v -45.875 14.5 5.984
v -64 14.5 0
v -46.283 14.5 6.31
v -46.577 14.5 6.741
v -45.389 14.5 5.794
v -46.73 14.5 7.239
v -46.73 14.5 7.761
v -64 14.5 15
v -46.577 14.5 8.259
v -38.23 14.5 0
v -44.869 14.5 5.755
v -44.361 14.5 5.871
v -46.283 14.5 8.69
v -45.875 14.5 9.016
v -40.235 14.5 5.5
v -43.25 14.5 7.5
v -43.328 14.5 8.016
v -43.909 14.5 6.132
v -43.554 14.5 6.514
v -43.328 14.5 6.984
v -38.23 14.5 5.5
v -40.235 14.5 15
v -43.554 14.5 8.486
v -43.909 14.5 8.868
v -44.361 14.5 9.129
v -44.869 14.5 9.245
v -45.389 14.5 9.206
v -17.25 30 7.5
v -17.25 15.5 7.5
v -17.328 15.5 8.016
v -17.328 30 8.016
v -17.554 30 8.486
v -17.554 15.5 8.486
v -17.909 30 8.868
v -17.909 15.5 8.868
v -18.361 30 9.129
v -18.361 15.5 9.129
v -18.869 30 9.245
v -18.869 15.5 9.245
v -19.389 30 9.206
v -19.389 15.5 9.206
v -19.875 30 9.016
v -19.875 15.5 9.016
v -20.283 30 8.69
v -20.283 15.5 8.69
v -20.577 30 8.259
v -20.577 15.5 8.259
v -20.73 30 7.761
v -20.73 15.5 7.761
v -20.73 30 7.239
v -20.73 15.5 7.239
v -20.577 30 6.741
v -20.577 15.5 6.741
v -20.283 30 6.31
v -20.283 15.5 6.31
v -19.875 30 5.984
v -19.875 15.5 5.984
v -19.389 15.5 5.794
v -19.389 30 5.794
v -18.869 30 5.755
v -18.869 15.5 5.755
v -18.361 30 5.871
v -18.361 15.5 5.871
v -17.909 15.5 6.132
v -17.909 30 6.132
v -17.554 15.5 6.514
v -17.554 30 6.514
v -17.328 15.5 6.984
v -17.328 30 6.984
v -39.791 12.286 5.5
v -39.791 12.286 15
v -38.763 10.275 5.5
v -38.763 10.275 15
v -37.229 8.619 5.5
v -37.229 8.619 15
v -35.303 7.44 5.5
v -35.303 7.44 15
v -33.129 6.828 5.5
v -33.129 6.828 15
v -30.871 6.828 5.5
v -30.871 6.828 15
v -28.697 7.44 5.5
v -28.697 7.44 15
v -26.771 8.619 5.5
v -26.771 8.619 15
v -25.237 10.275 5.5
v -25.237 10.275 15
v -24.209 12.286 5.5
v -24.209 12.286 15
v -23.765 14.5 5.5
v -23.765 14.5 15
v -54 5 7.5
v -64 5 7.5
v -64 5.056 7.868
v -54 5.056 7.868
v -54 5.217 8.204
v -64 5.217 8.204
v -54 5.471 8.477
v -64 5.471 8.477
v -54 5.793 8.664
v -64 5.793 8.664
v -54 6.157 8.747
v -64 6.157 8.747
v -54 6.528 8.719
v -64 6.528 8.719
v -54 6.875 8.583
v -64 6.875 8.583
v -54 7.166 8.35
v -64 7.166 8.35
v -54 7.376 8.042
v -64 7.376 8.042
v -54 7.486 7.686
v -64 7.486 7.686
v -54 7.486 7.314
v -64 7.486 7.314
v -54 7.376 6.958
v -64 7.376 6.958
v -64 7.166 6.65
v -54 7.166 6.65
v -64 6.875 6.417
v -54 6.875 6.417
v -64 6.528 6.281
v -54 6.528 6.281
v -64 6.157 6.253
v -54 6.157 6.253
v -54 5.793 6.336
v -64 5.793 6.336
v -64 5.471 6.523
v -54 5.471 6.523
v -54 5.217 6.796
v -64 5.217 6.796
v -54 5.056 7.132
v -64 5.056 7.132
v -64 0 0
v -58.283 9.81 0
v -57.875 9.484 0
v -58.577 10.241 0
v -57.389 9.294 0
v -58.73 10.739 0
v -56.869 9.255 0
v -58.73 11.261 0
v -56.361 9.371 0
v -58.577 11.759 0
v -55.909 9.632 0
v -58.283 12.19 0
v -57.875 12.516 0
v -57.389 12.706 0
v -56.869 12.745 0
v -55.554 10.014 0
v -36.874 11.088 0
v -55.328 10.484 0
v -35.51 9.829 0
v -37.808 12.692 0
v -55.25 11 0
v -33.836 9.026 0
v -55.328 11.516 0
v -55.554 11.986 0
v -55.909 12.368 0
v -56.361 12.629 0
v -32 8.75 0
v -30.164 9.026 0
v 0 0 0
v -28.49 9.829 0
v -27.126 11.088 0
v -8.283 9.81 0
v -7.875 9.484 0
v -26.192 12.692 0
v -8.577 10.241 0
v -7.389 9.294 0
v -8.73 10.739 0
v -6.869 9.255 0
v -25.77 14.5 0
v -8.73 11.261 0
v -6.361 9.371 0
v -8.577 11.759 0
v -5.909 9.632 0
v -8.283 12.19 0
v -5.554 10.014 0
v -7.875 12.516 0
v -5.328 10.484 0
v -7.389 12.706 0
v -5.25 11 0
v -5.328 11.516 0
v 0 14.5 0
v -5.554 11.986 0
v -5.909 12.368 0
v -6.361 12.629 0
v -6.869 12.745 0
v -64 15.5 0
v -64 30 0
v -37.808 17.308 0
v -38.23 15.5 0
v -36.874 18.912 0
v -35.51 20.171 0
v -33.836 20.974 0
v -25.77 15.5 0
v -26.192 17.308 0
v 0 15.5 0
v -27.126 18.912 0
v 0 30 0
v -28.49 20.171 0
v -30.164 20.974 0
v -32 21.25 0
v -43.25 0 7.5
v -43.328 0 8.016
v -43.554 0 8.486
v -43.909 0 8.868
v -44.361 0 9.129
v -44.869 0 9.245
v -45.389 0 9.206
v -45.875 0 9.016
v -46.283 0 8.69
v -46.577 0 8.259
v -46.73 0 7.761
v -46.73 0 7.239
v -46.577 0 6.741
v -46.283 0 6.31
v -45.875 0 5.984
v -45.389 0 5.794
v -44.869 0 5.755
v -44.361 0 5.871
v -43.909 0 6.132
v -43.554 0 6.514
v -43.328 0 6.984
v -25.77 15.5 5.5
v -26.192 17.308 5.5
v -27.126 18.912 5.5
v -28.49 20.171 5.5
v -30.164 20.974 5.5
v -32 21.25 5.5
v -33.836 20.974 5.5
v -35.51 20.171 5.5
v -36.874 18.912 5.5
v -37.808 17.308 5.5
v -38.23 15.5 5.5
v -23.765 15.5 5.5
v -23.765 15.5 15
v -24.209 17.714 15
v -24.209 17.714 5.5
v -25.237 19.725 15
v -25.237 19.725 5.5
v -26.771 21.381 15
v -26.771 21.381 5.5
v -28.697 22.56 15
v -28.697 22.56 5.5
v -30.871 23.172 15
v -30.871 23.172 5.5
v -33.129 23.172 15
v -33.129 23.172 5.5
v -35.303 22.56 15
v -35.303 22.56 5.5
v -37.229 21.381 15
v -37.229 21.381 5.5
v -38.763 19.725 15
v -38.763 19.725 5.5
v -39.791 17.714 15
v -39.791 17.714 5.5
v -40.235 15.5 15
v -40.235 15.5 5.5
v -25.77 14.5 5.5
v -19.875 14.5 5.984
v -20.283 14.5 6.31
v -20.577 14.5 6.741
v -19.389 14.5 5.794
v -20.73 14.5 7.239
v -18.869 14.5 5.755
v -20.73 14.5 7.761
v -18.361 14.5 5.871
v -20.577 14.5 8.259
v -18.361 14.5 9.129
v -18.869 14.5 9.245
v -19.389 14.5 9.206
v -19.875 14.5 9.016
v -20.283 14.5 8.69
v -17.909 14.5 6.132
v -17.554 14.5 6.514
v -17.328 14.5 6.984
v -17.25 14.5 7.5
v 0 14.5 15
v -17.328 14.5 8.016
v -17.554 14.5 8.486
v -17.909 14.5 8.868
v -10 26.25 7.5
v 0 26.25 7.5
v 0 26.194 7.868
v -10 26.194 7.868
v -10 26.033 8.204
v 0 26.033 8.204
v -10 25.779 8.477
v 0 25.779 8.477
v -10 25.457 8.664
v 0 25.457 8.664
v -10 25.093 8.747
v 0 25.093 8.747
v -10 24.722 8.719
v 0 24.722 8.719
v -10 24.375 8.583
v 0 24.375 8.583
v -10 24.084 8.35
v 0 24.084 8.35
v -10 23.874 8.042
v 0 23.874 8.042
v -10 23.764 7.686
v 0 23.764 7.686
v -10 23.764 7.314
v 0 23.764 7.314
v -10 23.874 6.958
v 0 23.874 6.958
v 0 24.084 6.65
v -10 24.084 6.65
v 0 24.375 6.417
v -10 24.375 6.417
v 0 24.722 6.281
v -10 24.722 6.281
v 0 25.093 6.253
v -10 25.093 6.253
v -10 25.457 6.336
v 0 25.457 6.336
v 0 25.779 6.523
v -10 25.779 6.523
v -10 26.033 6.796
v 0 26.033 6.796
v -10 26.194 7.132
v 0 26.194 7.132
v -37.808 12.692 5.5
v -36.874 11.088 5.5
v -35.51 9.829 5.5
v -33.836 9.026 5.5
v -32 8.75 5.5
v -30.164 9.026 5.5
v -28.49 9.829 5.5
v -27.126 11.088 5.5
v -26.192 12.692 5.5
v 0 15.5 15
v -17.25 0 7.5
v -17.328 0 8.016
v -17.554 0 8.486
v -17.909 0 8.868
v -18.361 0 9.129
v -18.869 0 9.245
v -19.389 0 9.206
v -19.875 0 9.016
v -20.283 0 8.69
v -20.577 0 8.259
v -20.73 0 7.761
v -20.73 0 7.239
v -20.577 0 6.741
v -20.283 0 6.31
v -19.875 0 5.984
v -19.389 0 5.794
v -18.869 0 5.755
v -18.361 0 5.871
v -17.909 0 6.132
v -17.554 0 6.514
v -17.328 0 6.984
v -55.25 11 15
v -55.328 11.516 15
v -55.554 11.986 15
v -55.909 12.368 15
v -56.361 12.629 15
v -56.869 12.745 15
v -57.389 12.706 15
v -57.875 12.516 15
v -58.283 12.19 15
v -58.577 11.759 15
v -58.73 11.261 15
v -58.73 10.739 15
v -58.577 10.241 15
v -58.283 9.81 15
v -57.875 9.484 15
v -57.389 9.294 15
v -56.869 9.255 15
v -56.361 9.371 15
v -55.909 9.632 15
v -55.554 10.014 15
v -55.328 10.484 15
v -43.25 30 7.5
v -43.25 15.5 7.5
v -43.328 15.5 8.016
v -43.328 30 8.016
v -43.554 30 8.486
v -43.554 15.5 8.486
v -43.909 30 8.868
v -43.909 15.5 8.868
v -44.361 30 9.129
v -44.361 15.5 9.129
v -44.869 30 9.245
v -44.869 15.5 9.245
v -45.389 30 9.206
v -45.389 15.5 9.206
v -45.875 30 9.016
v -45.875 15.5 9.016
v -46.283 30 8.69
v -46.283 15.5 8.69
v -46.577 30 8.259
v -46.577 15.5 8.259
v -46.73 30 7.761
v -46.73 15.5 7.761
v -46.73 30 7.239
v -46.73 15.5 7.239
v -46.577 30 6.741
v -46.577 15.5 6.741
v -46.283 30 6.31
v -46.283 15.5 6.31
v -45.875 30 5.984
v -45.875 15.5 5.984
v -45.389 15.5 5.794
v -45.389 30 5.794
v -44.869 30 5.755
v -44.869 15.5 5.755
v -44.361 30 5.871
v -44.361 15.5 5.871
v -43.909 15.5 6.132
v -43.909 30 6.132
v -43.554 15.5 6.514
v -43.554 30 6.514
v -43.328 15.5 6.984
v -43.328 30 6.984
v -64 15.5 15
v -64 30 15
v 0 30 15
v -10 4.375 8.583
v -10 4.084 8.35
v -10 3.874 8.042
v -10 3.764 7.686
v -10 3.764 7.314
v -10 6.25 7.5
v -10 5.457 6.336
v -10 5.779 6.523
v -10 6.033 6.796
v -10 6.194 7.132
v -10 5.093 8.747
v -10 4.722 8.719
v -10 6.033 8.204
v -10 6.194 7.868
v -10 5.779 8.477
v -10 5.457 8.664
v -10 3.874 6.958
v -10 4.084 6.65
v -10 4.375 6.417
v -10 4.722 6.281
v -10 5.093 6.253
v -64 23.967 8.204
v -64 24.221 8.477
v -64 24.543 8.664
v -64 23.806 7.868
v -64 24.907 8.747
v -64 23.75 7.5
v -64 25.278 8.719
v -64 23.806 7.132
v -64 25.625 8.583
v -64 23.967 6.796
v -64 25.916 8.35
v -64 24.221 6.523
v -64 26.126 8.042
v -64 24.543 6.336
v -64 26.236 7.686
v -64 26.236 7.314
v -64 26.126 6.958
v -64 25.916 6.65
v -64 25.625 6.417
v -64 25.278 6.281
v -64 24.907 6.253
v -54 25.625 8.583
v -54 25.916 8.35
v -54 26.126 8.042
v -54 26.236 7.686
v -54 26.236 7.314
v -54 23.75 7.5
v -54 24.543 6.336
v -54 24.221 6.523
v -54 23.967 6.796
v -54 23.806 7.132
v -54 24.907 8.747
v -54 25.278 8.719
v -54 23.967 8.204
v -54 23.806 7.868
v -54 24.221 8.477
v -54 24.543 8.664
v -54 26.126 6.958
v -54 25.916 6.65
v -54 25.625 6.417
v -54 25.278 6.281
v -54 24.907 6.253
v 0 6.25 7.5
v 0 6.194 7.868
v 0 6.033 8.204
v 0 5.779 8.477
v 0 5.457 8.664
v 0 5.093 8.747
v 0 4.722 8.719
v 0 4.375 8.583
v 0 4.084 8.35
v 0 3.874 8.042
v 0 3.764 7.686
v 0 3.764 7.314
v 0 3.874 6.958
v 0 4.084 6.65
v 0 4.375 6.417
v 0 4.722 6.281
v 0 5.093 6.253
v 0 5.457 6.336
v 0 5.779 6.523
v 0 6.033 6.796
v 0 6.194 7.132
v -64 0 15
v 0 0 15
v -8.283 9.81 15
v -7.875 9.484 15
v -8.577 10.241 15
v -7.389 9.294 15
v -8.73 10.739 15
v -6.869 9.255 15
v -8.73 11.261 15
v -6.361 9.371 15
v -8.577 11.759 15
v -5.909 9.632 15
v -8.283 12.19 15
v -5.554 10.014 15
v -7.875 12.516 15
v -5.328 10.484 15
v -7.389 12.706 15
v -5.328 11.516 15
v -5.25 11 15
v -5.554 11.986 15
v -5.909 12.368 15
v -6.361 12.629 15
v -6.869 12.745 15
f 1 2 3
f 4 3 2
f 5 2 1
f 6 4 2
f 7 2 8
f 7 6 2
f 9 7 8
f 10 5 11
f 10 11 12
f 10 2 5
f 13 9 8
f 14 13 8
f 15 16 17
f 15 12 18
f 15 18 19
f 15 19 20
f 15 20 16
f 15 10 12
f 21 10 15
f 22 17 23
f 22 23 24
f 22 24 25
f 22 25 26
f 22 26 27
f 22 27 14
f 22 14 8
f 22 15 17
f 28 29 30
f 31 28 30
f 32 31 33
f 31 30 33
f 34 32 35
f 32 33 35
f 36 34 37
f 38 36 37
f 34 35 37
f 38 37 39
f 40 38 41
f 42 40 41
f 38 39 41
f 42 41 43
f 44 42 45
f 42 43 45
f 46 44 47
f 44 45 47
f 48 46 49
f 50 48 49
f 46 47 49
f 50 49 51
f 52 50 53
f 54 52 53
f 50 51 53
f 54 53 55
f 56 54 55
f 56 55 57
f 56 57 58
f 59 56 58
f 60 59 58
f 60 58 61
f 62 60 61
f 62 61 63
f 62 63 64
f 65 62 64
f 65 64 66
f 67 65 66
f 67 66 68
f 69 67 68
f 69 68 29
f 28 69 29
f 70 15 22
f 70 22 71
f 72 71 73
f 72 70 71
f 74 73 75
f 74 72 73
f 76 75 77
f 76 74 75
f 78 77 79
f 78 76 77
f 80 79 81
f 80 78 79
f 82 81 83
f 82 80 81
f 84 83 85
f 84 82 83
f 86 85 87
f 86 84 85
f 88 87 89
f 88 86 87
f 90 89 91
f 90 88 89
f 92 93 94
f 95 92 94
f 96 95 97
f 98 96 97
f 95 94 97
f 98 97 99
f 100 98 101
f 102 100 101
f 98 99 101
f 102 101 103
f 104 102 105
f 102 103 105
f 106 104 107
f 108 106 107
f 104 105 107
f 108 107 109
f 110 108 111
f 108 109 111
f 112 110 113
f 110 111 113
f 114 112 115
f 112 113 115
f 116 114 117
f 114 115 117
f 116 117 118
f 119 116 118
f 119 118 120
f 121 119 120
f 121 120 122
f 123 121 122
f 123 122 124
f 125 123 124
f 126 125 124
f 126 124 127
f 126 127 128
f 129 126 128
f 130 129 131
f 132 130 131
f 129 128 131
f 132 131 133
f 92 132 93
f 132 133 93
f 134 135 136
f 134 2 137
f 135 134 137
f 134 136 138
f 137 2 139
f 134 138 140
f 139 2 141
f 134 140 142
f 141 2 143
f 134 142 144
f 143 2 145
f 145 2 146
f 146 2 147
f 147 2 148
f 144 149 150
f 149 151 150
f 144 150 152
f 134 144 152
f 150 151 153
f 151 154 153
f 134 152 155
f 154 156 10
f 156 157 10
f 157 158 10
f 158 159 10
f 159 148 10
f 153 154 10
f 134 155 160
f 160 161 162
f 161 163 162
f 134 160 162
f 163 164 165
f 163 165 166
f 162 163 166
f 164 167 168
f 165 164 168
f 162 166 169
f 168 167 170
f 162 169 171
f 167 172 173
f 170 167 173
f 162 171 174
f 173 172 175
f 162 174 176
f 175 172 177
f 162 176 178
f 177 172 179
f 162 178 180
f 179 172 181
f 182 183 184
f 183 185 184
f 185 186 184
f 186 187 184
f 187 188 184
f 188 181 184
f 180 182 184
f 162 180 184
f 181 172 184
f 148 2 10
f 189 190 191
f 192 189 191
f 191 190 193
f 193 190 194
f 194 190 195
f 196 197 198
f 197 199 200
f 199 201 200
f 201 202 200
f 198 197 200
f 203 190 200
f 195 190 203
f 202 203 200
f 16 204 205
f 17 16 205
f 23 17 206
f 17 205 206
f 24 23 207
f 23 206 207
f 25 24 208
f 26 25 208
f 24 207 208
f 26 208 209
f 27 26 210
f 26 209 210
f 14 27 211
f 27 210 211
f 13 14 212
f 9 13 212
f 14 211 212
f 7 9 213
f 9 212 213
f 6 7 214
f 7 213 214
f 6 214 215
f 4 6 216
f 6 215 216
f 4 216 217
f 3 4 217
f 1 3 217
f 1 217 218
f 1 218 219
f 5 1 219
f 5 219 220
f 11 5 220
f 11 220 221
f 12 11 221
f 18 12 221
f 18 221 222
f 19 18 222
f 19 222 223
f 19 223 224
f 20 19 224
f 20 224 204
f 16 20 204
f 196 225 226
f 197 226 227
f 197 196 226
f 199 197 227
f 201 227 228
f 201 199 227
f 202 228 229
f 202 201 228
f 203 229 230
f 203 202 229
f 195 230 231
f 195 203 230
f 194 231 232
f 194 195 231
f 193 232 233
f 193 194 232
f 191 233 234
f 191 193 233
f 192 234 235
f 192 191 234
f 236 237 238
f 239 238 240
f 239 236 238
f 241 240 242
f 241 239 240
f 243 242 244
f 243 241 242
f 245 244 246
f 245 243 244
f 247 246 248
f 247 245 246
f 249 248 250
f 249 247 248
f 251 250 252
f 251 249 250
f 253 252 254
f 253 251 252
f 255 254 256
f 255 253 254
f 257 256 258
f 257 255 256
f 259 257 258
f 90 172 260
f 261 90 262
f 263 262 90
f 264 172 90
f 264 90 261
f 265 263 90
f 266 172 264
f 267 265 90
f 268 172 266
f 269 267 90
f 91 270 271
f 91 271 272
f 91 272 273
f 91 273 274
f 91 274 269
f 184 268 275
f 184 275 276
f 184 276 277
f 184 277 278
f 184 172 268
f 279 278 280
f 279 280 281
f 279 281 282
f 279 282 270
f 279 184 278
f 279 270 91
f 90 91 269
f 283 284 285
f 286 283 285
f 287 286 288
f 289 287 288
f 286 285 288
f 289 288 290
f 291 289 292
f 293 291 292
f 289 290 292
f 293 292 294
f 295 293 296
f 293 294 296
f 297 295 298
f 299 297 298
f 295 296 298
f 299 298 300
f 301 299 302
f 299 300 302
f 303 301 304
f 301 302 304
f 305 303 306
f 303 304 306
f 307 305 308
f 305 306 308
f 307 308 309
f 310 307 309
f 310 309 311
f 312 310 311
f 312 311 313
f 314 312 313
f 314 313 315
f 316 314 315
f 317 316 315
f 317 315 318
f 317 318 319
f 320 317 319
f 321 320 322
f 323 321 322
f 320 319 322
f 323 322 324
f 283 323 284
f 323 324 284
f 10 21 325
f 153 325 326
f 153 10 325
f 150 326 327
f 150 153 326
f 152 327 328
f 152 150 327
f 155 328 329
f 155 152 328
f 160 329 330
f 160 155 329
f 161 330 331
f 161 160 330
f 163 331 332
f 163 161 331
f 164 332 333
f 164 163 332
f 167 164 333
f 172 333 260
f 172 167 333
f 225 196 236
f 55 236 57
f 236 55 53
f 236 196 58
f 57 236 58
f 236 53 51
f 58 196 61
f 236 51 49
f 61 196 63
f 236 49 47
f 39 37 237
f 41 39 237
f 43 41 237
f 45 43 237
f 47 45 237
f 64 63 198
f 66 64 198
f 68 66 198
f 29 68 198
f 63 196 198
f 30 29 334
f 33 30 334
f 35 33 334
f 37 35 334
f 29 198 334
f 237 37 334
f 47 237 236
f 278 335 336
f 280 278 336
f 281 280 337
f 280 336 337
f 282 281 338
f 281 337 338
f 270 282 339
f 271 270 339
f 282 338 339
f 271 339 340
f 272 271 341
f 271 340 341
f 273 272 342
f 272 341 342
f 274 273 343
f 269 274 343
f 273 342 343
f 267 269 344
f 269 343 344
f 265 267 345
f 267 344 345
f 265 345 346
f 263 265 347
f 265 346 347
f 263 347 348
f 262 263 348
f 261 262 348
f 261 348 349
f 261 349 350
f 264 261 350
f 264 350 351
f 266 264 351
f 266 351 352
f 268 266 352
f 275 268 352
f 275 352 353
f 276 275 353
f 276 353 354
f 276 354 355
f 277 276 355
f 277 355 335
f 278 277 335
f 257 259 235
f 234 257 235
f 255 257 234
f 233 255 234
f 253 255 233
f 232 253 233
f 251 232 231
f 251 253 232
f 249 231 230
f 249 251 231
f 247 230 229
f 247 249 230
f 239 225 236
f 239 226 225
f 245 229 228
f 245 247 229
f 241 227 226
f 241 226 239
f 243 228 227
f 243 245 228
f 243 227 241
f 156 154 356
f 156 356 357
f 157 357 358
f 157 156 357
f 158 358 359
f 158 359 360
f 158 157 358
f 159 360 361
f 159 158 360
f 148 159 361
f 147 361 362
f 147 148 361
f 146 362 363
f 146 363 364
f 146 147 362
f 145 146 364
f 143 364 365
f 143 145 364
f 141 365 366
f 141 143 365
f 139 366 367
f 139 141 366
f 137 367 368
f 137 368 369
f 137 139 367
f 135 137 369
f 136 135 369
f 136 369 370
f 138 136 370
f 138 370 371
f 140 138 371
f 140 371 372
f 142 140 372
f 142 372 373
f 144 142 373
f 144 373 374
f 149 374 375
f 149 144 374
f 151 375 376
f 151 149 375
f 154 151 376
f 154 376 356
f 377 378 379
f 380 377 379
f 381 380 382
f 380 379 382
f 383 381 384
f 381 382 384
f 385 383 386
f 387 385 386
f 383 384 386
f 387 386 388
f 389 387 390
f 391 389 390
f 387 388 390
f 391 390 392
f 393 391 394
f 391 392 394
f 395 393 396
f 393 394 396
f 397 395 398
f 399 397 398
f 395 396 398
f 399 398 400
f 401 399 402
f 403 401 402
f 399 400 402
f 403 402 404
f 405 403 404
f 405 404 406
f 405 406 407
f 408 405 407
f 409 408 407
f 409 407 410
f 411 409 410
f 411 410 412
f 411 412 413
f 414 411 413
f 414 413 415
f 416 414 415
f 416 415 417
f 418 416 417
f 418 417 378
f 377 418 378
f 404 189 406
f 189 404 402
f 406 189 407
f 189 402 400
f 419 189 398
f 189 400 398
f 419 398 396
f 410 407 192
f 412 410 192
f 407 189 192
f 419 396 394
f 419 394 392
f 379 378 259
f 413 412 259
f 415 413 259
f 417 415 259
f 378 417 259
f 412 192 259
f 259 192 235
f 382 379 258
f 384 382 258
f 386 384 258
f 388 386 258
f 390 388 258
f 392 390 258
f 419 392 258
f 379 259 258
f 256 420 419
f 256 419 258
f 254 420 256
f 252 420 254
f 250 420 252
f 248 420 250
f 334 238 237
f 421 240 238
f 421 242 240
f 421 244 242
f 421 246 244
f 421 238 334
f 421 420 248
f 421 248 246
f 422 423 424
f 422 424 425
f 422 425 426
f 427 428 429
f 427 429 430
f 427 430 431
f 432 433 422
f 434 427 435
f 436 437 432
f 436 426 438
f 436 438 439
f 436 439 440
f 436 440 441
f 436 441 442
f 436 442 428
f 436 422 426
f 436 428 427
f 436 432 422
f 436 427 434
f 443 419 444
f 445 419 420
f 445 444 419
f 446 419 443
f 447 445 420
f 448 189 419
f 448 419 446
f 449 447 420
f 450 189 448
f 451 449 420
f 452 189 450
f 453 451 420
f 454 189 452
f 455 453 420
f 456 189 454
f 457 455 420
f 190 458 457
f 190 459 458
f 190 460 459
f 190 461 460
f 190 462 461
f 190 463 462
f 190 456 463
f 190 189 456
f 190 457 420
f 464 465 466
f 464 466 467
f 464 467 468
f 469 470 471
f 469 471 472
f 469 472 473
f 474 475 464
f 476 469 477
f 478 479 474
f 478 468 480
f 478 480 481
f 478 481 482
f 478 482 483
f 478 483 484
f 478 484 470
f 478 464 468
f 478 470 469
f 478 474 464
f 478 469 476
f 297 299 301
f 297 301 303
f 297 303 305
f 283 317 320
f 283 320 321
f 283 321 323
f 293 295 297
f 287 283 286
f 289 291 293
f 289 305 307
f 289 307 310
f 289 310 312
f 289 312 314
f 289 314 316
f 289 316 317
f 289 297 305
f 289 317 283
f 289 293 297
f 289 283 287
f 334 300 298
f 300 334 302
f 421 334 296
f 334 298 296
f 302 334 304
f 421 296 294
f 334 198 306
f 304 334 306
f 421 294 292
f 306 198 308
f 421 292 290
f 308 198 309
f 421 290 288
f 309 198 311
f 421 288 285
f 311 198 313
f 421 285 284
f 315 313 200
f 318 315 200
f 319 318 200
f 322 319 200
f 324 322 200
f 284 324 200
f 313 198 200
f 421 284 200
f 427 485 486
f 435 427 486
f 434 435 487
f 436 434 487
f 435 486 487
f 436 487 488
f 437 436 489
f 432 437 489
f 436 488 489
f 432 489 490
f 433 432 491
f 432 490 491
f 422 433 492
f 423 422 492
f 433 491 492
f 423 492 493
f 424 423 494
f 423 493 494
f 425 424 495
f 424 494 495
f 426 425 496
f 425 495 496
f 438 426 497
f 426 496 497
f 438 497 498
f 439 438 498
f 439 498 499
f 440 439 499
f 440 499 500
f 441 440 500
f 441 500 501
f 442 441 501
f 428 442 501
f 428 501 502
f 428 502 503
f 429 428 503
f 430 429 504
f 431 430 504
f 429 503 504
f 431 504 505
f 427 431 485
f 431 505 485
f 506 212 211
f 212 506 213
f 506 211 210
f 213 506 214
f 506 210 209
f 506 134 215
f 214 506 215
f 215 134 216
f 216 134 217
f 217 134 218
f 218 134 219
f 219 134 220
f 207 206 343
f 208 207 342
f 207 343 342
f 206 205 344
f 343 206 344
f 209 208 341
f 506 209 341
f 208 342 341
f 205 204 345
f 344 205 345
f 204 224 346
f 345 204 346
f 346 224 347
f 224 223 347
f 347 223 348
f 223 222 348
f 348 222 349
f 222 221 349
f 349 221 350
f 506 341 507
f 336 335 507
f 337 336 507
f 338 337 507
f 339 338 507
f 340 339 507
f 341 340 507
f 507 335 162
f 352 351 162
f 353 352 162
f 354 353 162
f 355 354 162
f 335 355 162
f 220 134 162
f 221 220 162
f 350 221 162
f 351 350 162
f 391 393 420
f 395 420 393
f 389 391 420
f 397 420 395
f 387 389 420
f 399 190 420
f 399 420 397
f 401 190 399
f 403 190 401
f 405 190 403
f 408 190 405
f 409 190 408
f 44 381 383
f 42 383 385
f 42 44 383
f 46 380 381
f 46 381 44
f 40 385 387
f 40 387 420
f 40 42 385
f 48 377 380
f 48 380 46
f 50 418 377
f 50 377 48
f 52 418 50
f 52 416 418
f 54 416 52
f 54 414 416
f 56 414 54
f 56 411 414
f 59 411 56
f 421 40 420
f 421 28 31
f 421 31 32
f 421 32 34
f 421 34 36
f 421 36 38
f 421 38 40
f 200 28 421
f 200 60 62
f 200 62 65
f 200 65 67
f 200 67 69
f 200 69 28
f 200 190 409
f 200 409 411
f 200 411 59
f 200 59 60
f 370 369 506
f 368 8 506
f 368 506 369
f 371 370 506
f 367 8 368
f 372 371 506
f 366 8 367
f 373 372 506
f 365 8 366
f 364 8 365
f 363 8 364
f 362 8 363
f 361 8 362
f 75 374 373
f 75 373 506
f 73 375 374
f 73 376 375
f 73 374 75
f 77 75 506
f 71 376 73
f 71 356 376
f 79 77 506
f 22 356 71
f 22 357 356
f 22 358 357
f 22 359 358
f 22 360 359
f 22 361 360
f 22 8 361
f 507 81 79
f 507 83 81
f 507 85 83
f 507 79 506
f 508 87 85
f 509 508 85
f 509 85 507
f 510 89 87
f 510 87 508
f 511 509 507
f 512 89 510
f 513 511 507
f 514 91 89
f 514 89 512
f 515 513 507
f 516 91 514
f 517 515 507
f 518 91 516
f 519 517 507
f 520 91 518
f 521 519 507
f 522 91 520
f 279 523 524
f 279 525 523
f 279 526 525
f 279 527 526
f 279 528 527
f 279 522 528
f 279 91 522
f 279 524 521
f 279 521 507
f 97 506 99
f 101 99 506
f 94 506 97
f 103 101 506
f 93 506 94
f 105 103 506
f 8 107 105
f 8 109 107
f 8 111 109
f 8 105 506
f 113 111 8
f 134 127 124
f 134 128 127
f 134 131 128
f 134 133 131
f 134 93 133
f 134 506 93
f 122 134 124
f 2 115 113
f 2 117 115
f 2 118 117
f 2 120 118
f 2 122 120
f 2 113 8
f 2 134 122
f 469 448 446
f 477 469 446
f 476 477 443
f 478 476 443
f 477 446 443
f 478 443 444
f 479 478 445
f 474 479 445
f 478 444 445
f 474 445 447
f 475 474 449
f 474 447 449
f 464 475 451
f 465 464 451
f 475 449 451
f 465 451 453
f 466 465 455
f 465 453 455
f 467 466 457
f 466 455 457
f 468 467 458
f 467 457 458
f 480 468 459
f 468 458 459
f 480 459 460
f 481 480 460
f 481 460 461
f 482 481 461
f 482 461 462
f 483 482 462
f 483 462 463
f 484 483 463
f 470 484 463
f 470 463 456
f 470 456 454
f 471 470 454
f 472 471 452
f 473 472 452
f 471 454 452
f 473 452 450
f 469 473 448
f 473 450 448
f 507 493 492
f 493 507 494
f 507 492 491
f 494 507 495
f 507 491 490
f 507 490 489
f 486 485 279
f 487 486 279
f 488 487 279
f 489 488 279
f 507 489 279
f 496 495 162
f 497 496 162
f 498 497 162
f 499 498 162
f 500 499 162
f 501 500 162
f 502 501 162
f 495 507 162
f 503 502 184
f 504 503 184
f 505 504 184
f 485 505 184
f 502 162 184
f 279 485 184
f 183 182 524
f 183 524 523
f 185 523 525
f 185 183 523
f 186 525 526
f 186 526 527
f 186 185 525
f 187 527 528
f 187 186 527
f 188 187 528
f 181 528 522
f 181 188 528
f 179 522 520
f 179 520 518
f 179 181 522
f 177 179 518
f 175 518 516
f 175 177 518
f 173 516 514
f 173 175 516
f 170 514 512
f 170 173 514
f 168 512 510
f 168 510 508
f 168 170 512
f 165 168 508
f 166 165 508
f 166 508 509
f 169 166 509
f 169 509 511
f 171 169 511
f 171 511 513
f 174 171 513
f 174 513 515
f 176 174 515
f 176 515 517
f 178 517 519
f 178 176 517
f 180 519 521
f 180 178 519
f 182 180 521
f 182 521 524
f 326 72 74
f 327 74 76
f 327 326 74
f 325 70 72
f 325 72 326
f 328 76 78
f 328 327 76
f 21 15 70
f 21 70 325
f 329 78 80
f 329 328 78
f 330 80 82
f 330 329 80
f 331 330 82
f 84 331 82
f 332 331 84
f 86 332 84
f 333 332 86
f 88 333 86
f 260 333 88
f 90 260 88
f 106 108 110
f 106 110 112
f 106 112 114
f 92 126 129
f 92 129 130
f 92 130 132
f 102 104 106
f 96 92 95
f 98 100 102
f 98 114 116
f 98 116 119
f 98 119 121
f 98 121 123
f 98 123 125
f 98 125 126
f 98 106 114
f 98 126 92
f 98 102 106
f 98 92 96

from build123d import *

# Parameters (mm, degrees)
F0_W      = 64
F0_H      = 30
F0_R      = 1.75
F0_R_2    = 8.25
F1_DEPTH  = 15
F0_R_3    = 6.25
F2_DEPTH  = 5.5
F3_W      = 1
F3_H      = 15
F4_DEPTH  = 64.001
F6_R      = 1.75
F7_DEPTH  = 30.001
F8_R      = 1.25
F9_DEPTH  = 10
F10_R     = 1.25
F11_DEPTH = 10


with BuildPart() as f1:
    # F0 (on Top) → F1 (new body)
    with BuildSketch(Plane.XY):
        with Locations((-32, 15)):
            Rectangle(F0_W, F0_H)
        with Locations((-57, 11)):
            Circle(F0_R, mode=Mode.SUBTRACT)
        with Locations((-7, 11)):
            Circle(F0_R, mode=Mode.SUBTRACT)
        with Locations((-32, 15)):
            Circle(F0_R_2, mode=Mode.SUBTRACT)
    extrude(amount=F1_DEPTH)

    # F0 (on Top) → F2 (join)
    with BuildSketch(Plane.XY):
        with Locations((-32, 15)):
            Circle(F0_R_2)
        with Locations((-32, 15)):
            Circle(F0_R_3, mode=Mode.SUBTRACT)
    extrude(amount=F2_DEPTH)

    # F3 (on face) → F4 (cut, through all)
    with BuildSketch(Plane.YZ):
        with Locations((15, 7.5)):
            Rectangle(F3_W, F3_H)
    extrude(amount=-F4_DEPTH, mode=Mode.SUBTRACT)

    # F6 (on face) → F7 (cut, through all)
    with BuildSketch(Plane.XZ):
        with Locations((-45, 7.5)):
            Circle(F6_R)
        with Locations((-19, 7.5)):
            Circle(F6_R)
    extrude(amount=-F7_DEPTH, mode=Mode.SUBTRACT)

    # F8 (on face) → F9 (cut)
    with BuildSketch(Plane.YZ):
        with Locations((5, 7.5)):
            Circle(F8_R)
        with Locations((25, 7.5)):
            Circle(F8_R)
    extrude(amount=-F9_DEPTH, mode=Mode.SUBTRACT)

    # F10 (on face) → F11 (cut)
    with BuildSketch(Plane(origin=(-64, 0, 0), x_dir=(0, -1, 0), z_dir=(-1, 0, 0))):
        with Locations((-25, 7.5)):
            Circle(F10_R)
        with Locations((-6.25, 7.5)):
            Circle(F10_R)
    extrude(amount=-F11_DEPTH, mode=Mode.SUBTRACT)


solid = f1.part
